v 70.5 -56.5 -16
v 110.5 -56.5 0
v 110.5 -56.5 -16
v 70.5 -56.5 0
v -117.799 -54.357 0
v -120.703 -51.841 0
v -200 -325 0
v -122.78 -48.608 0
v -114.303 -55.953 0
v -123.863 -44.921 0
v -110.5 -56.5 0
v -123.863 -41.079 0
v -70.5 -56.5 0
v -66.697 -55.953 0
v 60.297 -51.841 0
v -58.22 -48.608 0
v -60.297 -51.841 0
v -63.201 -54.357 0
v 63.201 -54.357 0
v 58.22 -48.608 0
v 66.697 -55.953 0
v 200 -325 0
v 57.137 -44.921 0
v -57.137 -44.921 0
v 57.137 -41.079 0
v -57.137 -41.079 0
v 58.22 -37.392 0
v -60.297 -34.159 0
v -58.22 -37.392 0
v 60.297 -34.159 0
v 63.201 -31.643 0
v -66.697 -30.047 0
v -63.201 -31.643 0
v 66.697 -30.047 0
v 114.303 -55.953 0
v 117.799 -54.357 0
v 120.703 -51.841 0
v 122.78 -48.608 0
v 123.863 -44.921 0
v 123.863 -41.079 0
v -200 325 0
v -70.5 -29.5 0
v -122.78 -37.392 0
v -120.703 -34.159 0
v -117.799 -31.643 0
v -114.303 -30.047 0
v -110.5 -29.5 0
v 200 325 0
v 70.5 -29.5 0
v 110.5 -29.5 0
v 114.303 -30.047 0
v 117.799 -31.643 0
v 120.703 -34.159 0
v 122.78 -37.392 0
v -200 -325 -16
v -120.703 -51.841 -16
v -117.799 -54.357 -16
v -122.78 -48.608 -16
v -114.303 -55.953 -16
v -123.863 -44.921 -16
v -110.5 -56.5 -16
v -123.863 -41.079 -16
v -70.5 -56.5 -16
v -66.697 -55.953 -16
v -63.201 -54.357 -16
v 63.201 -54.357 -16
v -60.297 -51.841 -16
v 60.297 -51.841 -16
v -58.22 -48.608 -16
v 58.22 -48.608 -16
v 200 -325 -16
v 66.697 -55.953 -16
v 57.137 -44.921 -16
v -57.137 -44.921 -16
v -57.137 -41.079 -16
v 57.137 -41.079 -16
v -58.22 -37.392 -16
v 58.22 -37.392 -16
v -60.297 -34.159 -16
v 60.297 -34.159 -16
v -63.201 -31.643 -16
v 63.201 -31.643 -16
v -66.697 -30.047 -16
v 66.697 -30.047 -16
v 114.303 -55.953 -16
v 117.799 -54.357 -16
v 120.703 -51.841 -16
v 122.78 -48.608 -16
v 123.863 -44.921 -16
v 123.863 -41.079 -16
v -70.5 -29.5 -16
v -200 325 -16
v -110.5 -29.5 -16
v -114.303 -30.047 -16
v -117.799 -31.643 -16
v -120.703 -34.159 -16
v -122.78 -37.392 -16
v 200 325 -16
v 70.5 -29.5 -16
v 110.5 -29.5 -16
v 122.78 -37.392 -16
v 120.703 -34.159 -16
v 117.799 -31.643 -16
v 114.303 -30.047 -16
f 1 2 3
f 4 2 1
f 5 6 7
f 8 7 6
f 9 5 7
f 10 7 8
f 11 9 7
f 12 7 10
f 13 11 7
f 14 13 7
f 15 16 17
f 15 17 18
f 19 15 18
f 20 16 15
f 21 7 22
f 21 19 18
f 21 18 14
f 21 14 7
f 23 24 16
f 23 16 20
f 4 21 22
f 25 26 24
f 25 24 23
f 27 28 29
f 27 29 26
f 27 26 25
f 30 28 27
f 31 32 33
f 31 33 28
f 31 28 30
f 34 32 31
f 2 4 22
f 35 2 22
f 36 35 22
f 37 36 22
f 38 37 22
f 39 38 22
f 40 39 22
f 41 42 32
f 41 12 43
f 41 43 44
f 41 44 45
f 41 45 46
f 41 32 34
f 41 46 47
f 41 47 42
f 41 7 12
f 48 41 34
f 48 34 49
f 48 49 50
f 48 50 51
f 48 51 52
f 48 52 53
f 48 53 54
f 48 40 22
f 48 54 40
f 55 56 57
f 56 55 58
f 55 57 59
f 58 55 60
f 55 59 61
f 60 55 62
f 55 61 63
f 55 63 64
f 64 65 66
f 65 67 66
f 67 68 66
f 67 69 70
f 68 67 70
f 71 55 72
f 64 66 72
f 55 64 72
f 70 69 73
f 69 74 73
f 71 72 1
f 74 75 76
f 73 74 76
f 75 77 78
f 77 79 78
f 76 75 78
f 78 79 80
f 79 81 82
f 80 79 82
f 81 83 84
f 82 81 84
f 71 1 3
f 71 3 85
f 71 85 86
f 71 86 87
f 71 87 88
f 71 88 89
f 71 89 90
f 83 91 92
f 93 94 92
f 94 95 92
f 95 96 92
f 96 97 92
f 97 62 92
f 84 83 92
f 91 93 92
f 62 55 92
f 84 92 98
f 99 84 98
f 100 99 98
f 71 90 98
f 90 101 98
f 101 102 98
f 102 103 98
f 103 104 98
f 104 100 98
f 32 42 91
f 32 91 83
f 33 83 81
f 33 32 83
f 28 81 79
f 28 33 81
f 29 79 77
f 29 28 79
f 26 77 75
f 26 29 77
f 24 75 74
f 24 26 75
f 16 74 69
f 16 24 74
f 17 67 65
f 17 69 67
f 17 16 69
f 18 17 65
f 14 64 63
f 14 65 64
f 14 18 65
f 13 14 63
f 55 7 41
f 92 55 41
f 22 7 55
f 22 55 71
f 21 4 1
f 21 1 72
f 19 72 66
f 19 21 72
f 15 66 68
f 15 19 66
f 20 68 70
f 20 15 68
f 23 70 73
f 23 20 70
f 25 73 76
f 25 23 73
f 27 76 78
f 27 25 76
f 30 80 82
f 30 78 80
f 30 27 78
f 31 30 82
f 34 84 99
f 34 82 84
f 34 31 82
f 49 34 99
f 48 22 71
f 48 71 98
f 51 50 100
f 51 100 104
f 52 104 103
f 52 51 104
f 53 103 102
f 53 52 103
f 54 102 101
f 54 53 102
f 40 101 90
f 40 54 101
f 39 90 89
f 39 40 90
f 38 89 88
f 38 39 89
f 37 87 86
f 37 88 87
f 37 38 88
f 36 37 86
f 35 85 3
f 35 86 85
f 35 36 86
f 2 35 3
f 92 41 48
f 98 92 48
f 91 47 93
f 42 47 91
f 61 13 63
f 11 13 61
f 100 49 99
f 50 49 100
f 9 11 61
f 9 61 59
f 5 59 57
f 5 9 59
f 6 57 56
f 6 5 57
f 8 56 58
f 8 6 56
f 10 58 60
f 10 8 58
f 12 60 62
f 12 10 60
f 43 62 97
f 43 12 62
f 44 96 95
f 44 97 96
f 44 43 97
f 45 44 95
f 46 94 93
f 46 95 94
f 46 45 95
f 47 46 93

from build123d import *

# Parameters (mm, degrees)
SKETCH_1_W          = 400
SKETCH_1_H          = 650
EXTRUDE_1_DEPTH     = 16
CUT_EXTRUDE_1_DEPTH = 382.943713131


with BuildPart() as part:
    # 草图1 → 凸台-拉伸1 (new body)
    with BuildSketch(Plane.XY):
        Rectangle(SKETCH_1_W, SKETCH_1_H)
    extrude(amount=-EXTRUDE_1_DEPTH)

    # 草图2 → 切除-拉伸1 (cut, through all)
    with BuildSketch(Plane.XY):
        with BuildLine():
            Line((70.5, -29.5), (110.5, -29.5))
            ThreePointArc((110.5, -29.5), (124, -43), (110.5, -56.5))
            Line((110.5, -56.5), (70.5, -56.5))
            ThreePointArc((70.5, -56.5), (57, -43), (70.5, -29.5))
        make_face()
        with BuildLine():
            Line((-70.5, -56.5), (-110.5, -56.5))
            ThreePointArc((-110.5, -56.5), (-124, -43), (-110.5, -29.5))
            Line((-110.5, -29.5), (-70.5, -29.5))
            ThreePointArc((-70.5, -29.5), (-57, -43), (-70.5, -56.5))
        make_face()
    extrude(amount=-CUT_EXTRUDE_1_DEPTH, mode=Mode.SUBTRACT)


solid = part.part
